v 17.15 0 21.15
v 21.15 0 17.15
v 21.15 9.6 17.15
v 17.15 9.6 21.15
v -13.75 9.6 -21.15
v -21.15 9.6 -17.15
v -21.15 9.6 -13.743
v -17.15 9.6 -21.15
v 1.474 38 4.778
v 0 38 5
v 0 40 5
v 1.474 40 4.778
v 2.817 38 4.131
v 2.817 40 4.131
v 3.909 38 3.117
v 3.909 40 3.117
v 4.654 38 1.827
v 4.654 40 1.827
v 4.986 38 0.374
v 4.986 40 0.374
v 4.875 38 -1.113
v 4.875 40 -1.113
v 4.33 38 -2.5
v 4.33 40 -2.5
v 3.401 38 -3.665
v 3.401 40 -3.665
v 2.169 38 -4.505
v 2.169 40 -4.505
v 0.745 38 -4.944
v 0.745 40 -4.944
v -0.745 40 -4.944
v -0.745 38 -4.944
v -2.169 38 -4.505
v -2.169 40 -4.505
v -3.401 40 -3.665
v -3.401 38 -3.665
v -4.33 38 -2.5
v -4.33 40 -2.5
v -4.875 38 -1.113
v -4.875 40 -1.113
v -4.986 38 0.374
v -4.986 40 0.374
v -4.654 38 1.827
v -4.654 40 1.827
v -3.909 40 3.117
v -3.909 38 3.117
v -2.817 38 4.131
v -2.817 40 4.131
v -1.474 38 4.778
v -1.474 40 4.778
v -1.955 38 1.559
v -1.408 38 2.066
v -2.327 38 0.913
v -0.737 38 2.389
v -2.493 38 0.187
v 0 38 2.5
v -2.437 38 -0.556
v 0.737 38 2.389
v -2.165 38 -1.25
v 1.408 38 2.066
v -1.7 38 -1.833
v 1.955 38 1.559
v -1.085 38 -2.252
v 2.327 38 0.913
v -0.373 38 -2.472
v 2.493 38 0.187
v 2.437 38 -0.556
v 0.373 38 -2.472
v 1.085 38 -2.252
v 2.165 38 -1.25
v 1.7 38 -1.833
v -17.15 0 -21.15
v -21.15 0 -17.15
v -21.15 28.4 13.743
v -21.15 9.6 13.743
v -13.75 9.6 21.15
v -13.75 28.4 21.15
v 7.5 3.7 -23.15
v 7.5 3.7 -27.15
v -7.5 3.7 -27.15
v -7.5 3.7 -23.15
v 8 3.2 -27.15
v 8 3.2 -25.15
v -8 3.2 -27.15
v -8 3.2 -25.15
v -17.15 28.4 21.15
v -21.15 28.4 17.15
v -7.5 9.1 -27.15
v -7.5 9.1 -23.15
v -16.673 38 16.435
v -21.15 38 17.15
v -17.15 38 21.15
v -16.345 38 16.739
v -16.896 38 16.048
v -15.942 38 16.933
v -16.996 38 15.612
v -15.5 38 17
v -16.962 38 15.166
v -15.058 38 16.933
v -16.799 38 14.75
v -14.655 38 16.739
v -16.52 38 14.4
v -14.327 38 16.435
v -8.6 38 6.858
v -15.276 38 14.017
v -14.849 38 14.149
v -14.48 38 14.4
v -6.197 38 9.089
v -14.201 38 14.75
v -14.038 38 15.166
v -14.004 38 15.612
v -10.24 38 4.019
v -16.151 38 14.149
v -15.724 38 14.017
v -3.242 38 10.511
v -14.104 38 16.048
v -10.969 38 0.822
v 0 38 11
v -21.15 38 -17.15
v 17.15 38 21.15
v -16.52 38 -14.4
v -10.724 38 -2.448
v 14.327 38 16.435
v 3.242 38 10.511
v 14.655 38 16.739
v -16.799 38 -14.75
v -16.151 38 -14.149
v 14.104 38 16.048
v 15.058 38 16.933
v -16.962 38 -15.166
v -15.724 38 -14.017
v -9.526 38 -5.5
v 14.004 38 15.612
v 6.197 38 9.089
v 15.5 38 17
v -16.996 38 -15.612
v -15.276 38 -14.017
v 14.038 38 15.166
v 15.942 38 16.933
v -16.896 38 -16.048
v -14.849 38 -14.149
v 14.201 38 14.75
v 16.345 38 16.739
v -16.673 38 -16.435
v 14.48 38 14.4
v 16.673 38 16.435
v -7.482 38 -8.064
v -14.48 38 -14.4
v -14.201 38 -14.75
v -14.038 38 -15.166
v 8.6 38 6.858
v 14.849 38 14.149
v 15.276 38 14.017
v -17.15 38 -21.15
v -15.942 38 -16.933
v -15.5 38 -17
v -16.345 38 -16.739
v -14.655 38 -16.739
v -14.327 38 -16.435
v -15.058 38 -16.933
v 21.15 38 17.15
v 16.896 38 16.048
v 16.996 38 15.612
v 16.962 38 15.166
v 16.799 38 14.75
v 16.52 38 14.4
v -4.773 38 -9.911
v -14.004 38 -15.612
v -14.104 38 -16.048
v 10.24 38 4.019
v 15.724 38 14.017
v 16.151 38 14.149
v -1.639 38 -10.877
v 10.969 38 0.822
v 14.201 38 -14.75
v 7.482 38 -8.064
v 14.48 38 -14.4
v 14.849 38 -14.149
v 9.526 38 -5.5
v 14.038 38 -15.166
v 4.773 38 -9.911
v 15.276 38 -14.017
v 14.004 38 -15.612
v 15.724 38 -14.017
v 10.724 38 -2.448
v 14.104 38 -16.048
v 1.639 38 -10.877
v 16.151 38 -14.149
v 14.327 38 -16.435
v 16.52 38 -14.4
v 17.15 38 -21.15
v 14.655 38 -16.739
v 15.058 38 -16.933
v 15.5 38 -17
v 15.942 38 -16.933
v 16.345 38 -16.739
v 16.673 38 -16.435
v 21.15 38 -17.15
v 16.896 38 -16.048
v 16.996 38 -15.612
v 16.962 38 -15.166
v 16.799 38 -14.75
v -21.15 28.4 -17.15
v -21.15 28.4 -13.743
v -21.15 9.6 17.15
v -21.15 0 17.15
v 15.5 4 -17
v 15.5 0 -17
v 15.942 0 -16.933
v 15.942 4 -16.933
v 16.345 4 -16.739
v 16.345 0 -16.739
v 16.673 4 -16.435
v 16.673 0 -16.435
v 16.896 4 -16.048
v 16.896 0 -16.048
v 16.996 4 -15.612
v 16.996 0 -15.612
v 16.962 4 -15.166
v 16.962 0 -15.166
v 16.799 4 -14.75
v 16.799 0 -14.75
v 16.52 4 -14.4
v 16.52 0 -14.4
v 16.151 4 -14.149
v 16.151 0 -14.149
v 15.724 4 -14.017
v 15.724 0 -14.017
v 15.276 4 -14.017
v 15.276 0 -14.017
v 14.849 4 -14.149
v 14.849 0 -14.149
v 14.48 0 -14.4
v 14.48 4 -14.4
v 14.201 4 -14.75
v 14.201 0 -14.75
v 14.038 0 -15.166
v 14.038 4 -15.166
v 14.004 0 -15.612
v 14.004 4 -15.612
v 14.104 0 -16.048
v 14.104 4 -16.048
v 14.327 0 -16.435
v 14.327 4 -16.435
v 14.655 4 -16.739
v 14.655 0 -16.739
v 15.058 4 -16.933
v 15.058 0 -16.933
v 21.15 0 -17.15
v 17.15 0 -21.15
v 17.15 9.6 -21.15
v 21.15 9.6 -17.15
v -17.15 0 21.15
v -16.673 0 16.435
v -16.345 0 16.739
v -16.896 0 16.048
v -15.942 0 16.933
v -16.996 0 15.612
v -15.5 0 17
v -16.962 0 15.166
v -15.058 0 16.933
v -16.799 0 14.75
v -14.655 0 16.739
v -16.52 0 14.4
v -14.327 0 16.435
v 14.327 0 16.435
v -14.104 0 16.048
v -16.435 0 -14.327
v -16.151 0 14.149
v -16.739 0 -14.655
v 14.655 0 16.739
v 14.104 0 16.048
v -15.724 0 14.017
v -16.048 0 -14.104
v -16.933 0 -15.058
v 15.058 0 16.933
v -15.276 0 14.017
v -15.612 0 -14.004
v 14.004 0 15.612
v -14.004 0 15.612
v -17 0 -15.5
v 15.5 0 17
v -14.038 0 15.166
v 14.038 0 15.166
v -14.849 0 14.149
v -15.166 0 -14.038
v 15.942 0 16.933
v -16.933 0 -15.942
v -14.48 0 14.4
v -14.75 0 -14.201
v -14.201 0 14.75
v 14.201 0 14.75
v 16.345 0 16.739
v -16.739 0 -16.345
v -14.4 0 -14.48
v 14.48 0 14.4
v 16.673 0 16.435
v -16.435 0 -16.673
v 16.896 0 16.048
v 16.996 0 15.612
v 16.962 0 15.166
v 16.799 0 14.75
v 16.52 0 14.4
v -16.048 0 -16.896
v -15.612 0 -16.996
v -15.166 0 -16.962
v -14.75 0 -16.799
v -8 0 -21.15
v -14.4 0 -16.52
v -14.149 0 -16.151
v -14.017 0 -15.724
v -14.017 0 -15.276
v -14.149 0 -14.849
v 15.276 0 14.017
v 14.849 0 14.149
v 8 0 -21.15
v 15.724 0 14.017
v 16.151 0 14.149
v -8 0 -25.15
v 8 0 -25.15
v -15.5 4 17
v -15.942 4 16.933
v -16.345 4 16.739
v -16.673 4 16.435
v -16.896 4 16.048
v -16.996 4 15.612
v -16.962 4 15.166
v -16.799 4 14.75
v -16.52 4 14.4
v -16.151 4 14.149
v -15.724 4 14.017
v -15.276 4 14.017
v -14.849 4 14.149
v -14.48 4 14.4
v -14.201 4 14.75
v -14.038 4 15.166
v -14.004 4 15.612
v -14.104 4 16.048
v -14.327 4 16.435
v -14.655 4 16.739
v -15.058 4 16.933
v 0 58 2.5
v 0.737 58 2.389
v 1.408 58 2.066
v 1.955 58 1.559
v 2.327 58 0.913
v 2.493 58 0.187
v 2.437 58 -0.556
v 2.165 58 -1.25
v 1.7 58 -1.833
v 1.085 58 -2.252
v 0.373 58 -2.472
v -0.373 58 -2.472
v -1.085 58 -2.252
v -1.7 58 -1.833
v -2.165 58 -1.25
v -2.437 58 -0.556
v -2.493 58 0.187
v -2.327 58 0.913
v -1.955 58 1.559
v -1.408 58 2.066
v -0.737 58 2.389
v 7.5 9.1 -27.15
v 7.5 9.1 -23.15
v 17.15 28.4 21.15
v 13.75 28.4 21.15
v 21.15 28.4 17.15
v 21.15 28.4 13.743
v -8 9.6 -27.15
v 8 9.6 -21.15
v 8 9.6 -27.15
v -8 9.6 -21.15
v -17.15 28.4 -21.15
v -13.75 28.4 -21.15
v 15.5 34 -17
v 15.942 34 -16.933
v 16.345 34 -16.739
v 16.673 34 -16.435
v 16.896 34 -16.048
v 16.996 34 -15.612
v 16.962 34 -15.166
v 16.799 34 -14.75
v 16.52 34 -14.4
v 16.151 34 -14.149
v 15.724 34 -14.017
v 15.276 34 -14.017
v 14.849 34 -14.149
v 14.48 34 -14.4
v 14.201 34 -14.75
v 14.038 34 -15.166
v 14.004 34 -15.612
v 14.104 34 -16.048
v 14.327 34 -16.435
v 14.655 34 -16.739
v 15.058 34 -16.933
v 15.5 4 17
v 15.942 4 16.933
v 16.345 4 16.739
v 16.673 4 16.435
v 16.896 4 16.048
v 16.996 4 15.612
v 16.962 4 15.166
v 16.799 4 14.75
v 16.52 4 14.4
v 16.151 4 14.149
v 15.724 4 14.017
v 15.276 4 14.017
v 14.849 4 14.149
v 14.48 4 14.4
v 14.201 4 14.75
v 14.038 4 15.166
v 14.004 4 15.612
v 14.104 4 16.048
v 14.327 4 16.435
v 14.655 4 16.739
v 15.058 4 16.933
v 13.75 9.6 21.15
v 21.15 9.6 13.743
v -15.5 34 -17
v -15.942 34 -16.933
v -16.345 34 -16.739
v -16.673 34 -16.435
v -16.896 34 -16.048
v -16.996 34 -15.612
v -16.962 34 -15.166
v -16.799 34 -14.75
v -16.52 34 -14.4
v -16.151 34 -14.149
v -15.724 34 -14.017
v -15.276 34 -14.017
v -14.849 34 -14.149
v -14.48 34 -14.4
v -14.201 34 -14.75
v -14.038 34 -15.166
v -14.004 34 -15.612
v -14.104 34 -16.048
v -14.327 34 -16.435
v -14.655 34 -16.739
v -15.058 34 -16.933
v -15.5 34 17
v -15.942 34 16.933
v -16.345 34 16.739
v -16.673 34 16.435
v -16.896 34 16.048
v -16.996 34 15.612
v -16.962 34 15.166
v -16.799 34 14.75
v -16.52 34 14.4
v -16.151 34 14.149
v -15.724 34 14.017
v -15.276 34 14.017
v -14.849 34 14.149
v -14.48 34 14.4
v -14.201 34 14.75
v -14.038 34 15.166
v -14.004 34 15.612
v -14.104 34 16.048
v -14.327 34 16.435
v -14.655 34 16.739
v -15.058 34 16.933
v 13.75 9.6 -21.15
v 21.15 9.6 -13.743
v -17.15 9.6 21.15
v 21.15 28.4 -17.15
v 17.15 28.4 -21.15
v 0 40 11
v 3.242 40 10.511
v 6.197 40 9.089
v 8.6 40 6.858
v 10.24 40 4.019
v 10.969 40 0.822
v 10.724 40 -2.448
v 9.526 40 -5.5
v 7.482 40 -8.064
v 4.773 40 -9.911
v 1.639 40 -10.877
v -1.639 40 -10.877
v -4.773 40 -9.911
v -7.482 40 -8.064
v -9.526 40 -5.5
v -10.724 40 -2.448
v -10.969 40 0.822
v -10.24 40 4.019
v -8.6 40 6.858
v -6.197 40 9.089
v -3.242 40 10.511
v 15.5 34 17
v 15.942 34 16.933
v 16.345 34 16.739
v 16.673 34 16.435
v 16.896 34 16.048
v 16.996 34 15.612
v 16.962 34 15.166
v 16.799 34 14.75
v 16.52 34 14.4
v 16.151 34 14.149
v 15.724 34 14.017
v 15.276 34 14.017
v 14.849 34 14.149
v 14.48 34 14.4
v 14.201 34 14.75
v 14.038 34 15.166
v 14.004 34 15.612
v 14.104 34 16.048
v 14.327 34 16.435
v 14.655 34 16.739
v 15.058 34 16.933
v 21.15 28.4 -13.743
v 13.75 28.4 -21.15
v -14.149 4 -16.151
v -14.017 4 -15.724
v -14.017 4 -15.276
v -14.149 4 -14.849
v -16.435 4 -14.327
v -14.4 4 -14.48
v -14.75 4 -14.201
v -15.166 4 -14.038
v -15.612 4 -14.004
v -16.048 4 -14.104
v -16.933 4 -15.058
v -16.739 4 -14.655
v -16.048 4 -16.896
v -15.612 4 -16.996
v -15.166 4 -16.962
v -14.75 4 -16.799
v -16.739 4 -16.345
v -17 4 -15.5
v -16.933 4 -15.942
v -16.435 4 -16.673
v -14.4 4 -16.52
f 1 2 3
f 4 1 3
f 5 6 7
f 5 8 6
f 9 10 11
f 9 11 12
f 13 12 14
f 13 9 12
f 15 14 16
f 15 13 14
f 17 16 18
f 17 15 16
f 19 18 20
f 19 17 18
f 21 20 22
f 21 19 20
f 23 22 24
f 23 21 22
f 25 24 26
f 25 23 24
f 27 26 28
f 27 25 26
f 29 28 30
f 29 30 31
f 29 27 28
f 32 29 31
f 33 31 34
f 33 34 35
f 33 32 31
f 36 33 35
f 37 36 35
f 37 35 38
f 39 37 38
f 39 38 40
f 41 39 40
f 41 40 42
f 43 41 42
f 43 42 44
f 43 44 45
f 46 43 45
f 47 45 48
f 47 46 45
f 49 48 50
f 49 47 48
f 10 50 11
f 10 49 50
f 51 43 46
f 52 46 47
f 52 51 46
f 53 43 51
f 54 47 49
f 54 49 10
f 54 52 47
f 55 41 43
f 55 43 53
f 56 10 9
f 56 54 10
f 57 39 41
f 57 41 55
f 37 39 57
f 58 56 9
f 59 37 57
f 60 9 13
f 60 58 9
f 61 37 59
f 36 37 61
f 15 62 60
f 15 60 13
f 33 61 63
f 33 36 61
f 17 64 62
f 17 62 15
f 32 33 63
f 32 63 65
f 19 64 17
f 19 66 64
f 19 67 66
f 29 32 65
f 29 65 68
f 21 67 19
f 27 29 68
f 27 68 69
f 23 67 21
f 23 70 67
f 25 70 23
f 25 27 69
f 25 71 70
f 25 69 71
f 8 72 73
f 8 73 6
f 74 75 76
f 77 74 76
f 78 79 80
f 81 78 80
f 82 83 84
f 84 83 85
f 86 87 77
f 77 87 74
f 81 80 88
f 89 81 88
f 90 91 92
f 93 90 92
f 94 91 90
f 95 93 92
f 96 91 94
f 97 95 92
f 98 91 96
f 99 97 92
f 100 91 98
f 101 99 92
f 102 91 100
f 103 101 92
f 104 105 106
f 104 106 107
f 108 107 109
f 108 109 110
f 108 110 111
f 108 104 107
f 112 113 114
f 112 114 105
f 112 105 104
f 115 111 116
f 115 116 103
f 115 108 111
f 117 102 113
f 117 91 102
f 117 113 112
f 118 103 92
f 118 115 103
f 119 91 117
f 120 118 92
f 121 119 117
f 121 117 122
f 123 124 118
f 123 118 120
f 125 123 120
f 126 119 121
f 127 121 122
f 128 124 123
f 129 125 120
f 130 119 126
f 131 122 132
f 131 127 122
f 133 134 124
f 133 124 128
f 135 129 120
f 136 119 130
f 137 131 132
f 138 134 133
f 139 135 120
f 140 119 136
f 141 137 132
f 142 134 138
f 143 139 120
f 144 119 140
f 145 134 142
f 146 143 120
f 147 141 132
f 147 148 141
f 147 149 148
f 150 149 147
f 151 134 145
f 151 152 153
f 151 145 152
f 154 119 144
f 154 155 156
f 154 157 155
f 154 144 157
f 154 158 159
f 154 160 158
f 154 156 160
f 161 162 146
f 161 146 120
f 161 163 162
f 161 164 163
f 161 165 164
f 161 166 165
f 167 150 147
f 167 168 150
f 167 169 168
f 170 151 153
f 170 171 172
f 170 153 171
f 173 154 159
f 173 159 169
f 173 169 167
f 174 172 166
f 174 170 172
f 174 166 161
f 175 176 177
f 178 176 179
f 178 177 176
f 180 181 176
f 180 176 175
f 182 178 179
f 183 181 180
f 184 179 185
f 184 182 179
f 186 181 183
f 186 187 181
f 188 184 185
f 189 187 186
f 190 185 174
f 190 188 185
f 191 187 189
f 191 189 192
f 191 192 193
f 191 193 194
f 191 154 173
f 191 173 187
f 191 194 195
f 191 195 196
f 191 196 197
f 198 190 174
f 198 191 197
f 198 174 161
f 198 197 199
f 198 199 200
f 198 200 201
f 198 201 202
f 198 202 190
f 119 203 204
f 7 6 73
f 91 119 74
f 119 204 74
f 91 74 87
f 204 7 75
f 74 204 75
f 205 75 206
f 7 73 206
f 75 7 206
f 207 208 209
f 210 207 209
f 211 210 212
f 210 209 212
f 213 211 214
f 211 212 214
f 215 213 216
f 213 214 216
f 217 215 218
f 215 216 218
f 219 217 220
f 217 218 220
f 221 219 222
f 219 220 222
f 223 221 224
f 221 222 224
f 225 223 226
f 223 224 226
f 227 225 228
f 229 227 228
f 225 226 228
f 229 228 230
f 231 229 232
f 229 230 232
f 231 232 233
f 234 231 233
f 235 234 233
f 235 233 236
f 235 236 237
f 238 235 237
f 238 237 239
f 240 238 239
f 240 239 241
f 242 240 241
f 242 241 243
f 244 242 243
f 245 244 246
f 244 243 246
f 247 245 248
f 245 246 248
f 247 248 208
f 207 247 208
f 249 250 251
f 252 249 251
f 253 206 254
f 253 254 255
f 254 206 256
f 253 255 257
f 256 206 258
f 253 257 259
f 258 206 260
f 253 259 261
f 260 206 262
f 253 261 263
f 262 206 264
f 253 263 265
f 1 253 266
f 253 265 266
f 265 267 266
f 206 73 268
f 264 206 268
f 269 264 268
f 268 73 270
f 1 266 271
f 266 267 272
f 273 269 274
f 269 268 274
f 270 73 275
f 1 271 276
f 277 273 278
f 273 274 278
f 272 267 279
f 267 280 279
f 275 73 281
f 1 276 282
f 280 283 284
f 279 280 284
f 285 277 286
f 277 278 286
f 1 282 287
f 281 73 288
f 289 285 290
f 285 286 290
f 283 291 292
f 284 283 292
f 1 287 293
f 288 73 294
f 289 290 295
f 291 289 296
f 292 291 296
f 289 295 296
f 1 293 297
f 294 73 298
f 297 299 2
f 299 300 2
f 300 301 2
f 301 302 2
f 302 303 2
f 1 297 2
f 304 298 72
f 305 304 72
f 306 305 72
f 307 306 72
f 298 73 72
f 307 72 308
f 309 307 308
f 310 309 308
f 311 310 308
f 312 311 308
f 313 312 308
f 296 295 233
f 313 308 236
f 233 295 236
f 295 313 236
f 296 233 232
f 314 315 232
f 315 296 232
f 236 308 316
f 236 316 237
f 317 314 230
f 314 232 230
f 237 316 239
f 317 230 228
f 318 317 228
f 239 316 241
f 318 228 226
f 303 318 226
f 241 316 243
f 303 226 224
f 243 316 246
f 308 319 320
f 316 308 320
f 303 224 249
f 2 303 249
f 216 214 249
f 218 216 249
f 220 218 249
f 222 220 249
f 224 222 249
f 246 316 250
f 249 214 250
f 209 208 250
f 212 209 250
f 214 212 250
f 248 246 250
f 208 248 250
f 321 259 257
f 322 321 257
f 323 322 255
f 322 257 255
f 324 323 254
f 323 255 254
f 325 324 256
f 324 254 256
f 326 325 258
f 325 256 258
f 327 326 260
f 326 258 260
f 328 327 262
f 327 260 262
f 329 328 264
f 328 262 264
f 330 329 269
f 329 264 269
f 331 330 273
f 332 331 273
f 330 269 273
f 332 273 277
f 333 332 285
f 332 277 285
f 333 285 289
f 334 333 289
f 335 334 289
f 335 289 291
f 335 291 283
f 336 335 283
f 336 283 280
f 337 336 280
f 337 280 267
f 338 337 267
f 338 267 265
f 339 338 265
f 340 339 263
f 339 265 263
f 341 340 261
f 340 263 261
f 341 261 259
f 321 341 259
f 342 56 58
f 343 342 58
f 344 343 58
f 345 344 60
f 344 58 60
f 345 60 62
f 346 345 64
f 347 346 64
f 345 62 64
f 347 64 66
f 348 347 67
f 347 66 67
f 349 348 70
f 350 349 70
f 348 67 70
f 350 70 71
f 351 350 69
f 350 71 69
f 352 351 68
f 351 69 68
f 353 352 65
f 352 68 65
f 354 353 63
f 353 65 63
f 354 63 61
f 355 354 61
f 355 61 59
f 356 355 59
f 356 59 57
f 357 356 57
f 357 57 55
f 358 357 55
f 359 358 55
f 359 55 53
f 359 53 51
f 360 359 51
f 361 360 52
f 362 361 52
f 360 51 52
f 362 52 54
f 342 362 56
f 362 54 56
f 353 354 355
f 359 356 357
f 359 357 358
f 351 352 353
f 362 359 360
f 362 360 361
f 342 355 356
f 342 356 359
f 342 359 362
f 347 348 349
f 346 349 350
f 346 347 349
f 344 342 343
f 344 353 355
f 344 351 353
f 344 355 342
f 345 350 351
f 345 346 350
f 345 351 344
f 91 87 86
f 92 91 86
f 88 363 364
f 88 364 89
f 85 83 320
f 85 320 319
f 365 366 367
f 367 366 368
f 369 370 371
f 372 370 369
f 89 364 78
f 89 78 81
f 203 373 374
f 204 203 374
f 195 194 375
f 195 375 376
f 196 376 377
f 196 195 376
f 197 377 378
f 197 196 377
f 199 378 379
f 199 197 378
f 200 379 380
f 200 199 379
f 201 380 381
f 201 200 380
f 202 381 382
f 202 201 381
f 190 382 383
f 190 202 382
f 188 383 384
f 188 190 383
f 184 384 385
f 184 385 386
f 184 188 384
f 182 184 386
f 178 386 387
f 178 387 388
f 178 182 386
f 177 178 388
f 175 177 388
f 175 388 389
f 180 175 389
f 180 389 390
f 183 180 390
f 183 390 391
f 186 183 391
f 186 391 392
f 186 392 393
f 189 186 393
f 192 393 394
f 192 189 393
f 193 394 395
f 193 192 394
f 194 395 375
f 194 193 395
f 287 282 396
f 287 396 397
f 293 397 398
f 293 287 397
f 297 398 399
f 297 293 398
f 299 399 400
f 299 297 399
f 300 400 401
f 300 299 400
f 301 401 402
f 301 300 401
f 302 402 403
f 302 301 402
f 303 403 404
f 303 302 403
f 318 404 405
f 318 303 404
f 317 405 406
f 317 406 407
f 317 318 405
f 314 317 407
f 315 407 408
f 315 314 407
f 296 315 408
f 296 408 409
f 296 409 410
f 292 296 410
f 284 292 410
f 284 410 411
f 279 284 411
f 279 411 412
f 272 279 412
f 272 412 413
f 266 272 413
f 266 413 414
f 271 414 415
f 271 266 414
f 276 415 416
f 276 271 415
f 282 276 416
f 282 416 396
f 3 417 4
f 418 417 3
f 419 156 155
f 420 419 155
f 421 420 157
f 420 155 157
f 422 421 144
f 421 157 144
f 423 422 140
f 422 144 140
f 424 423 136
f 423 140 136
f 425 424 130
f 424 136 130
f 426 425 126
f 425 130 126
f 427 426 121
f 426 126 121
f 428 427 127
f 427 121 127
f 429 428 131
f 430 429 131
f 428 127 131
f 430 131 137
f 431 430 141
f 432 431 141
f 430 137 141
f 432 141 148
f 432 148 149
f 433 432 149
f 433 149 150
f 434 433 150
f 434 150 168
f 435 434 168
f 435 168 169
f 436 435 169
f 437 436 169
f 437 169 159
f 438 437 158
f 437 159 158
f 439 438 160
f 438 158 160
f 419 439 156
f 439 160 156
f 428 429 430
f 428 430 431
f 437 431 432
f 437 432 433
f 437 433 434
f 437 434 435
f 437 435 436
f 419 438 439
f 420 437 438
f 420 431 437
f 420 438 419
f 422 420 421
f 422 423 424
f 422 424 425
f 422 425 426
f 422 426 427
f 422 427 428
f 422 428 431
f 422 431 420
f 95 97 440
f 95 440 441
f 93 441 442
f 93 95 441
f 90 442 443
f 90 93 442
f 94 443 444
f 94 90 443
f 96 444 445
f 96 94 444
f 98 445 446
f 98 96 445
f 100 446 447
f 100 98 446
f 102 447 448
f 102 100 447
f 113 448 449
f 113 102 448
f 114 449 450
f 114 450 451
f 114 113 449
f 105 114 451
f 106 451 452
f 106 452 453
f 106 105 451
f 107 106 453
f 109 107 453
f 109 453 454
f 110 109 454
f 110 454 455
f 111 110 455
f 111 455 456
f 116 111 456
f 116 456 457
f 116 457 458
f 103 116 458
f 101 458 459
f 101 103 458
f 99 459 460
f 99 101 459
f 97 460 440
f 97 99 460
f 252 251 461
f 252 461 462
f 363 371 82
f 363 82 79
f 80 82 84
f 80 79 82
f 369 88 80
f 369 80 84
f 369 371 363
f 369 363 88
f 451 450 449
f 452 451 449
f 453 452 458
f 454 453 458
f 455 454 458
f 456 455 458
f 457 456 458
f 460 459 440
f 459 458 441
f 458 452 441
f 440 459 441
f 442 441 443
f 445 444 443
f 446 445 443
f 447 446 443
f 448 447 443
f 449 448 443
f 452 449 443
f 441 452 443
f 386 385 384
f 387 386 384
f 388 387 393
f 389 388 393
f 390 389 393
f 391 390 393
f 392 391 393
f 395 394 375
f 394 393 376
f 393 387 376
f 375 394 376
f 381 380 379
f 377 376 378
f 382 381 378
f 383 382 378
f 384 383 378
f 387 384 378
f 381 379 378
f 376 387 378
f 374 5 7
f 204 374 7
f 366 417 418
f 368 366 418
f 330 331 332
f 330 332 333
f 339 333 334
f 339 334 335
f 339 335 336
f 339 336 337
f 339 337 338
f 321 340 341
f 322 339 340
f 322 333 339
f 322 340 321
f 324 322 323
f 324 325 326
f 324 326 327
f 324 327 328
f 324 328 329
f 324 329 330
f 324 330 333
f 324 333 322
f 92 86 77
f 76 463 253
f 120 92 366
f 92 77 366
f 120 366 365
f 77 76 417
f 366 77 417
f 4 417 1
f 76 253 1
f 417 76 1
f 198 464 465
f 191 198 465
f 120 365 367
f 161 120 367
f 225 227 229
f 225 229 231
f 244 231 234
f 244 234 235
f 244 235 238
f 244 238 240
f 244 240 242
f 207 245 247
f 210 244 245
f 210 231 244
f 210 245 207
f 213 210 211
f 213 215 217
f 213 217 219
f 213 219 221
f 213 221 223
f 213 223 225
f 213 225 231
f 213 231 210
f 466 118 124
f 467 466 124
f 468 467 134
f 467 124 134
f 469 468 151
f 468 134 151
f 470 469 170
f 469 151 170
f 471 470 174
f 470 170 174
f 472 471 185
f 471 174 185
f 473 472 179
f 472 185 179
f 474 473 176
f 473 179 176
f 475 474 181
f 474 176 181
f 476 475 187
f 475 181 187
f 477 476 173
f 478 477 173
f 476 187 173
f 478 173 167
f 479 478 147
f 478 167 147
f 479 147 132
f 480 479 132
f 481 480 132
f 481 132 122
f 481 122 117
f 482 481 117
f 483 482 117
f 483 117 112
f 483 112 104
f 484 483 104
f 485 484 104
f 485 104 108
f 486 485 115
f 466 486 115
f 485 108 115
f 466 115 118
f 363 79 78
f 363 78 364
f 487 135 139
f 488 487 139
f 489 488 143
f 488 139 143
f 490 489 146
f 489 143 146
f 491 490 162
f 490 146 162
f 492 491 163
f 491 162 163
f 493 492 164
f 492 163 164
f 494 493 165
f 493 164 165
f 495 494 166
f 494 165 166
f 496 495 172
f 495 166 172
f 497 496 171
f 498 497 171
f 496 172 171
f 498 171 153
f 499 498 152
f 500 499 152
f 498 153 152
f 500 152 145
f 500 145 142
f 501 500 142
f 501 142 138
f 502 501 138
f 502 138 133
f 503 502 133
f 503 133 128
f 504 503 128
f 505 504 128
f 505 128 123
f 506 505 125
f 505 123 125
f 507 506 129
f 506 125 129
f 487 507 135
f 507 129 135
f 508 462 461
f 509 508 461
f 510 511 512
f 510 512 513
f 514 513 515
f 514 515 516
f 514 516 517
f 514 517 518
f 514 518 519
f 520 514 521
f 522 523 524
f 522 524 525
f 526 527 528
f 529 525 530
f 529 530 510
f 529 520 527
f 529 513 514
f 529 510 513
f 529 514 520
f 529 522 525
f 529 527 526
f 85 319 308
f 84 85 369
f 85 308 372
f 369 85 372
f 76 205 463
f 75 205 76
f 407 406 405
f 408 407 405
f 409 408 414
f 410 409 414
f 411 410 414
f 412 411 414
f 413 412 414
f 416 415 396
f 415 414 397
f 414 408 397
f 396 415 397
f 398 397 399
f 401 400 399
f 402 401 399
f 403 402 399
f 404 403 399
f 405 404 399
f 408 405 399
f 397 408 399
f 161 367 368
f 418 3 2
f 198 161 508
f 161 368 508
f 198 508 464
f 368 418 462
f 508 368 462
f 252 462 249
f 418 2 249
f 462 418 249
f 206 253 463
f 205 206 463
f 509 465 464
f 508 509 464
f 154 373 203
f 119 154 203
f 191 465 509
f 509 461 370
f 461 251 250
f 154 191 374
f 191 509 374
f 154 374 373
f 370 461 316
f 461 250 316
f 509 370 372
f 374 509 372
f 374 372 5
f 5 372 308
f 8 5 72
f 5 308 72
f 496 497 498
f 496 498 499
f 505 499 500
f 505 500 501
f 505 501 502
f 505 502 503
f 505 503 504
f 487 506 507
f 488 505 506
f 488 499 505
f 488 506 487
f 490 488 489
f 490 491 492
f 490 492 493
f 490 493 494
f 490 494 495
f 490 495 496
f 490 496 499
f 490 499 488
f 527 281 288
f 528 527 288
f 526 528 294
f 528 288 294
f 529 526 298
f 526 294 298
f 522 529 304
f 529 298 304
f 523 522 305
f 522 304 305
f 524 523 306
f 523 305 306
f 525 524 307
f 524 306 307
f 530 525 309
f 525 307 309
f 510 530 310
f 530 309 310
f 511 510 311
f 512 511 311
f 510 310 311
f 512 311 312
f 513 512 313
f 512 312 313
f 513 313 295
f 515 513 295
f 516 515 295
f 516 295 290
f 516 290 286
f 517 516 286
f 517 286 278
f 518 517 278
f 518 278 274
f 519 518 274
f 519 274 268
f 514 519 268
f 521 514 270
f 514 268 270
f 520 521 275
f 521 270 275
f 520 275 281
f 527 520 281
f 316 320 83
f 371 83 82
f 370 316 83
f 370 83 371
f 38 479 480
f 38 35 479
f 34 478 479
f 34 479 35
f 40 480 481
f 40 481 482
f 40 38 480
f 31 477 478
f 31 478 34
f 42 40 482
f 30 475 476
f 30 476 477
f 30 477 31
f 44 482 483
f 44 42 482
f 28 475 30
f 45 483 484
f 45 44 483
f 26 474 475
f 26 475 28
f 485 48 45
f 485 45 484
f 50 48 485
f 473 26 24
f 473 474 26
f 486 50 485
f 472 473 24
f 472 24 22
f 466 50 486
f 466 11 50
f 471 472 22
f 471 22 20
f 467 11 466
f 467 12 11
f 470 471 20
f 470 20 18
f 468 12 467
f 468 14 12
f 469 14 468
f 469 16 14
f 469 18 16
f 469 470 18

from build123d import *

# Parameters (mm, degrees)
SKETCH1_W               = 42.3
SKETCH1_H               = 42.3
BOSS_EXTRUDE1_DEPTH     = 9.6
CHAMFER1_SIZE           = 4
BOSS_EXTRUDE2_DEPTH     = 18.8
BOSS_EXTRUDE3_DEPTH     = 9.6
SKETCH4_R               = 11
SKETCH4_R_2             = 5
BOSS_EXTRUDE4_DEPTH     = 2
SKETCH5_R               = 2.5
BOSS_EXTRUDE5_DEPTH     = 20
SKETCH8_R               = 1.5
CUT_EXTRUDE1_DEPTH      = 4
MIRROR2_COPY_1_SKETCH_R = 1.5
MIRROR2_COPY_1_DEPTH    = 4
MIRROR3_COPY_1_SKETCH_R = 1.5
MIRROR3_COPY_1_DEPTH    = 4
MIRROR3_COPY_2_SKETCH_R = 1.5
MIRROR3_COPY_2_DEPTH    = 4
MIRROR3_COPY_3_SKETCH_R = 1.5
MIRROR3_COPY_3_DEPTH    = 4
SKETCH9_W               = 16
SKETCH9_H               = 9.6
BOSS_EXTRUDE6_DEPTH     = 4
SKETCH10_W              = 16
SKETCH10_H              = 6.4
BOSS_EXTRUDE7_DEPTH     = 2
SKETCH11_W              = 15
SKETCH11_H              = 5.4
CUT_EXTRUDE2_DEPTH      = 4


with BuildPart() as part:
    # Sketch1 → Boss-Extrude1 (new body)
    with BuildSketch(Plane(origin=(0, 0, 0), x_dir=(1, 0, 0), z_dir=(0, 1, 0))):
        Rectangle(SKETCH1_W, SKETCH1_H)
    extrude(amount=BOSS_EXTRUDE1_DEPTH)

    # Chamfer1
    chamfer1_edges = [part.edges().sort_by_distance(p)[0] for p in [
        (-21.15, 4.8, -21.15),
        (21.15, 4.8, -21.15),
        (21.15, 4.8, 21.15),
        (-21.15, 4.8, 21.15),
    ]]
    chamfer(chamfer1_edges, length=CHAMFER1_SIZE)

    # Sketch2 → Boss-Extrude2 (add)
    with BuildSketch(Plane(origin=(0, 9.6, 0), x_dir=(1, 0, 0), z_dir=(0, 1, 0))):
        Polygon((13.75, -21.15), (21.15, -13.74318557), (21.15, 13.74318557), (13.75, 21.15), (-13.75, 21.15), (-21.15, 13.74318557), (-21.15, -13.74318557), (-13.75, -21.15), align=None)
    extrude(amount=BOSS_EXTRUDE2_DEPTH)

    # Sketch3 → Boss-Extrude3 (add)
    with BuildSketch(Plane(origin=(0, 28.4, 0), x_dir=(1, 0, 0), z_dir=(0, 1, 0))):
        Polygon((17.15, 21.15), (-17.15, 21.15), (-21.15, 17.15), (-21.15, -17.15), (-17.15, -21.15), (17.15, -21.15), (21.15, -17.15), (21.15, 17.15), align=None)
    extrude(amount=BOSS_EXTRUDE3_DEPTH)

    # Sketch4 → Boss-Extrude4 (add)
    with BuildSketch(Plane(origin=(0, 38, 0), x_dir=(1, 0, 0), z_dir=(0, 1, 0))):
        with Locations(Location((0, 0, 0), (0, 0, 270))):
            Circle(SKETCH4_R)
        with Locations(Location((0, 0, 0), (0, 0, 270))):
            Circle(SKETCH4_R_2, mode=Mode.SUBTRACT)
    extrude(amount=BOSS_EXTRUDE4_DEPTH)

    # Sketch5 → Boss-Extrude5 (add)
    with BuildSketch(Plane(origin=(0, 38, 0), x_dir=(1, 0, 0), z_dir=(0, 1, 0))):
        with Locations(Location((0, 0, 0), (0, 0, 270))):
            Circle(SKETCH5_R)
    extrude(amount=BOSS_EXTRUDE5_DEPTH)

    # Sketch8 → Cut-Extrude1 (cut)
    with BuildSketch(Plane(origin=(0, 38, 0), x_dir=(1, 0, 0), z_dir=(0, 1, 0))):
        with Locations(Location((15.5, -15.5, 0), (0, 0, 270))):
            Circle(SKETCH8_R)
    cut_extrude1 = extrude(amount=-CUT_EXTRUDE1_DEPTH, mode=Mode.SUBTRACT)

    # Mirror1: Cut-Extrude1 across plane
    add(cut_extrude1.mirror(Plane.XY), mode=Mode.SUBTRACT)

    # Mirror2: Cut-Extrude1 across plane
    add(cut_extrude1.mirror(Plane(origin=(0, 0, 0), x_dir=(0, 0, 1), z_dir=(1, 0, 0))), mode=Mode.SUBTRACT)

    # Mirror2 copy 1 sketch → Mirror2 copy 1 (cut)
    with BuildSketch(Plane(origin=(0, 38, 0), x_dir=(-1, 0, 0), z_dir=(0, 1, 0))):
        with Locations(Location((15.5, -15.5, 0), (0, 0, 270))):
            Circle(MIRROR2_COPY_1_SKETCH_R)
    extrude(amount=-MIRROR2_COPY_1_DEPTH, mode=Mode.SUBTRACT)

    # Mirror3: Cut-Extrude1 across plane
    add(cut_extrude1.mirror(Plane.ZX.offset(19)), mode=Mode.SUBTRACT)

    # Mirror3 copy 1 sketch → Mirror3 copy 1 (cut)
    with BuildSketch(Plane.XZ):
        with Locations(Location((15.5, -15.5, 0), (0, 0, 270))):
            Circle(MIRROR3_COPY_1_SKETCH_R)
    extrude(amount=-MIRROR3_COPY_1_DEPTH, mode=Mode.SUBTRACT)

    # Mirror3 copy 2 sketch → Mirror3 copy 2 (cut)
    with BuildSketch(Plane(origin=(0, 0, 0), x_dir=(-1, 0, 0), z_dir=(0, -1, 0))):
        with Locations(Location((15.5, -15.5, 0), (0, 0, 270))):
            Circle(MIRROR3_COPY_2_SKETCH_R)
    extrude(amount=-MIRROR3_COPY_2_DEPTH, mode=Mode.SUBTRACT)

    # Mirror3 copy 3 sketch → Mirror3 copy 3 (cut)
    with BuildSketch(Plane(origin=(0, 0, 0), x_dir=(-1, 0, 0), z_dir=(0, -1, 0))):
        with Locations((15.5, 15.5)):
            Circle(MIRROR3_COPY_3_SKETCH_R)
    extrude(amount=-MIRROR3_COPY_3_DEPTH, mode=Mode.SUBTRACT)

    # Sketch9 → Boss-Extrude6 (add)
    with BuildSketch(Plane(origin=(0, 0, -21.15), x_dir=(-1, 0, 0), z_dir=(0, 0, -1))):
        with Locations((0, 4.8)):
            Rectangle(SKETCH9_W, SKETCH9_H)
    extrude(amount=BOSS_EXTRUDE6_DEPTH)

    # Sketch10 → Boss-Extrude7 (add)
    with BuildSketch(Plane(origin=(0, 0, -25.15), x_dir=(-1, 0, 0), z_dir=(0, 0, -1))):
        with Locations((0, 6.4)):
            Rectangle(SKETCH10_W, SKETCH10_H)
    extrude(amount=BOSS_EXTRUDE7_DEPTH)

    # Sketch11 → Cut-Extrude2 (cut)
    with BuildSketch(Plane(origin=(0, 0, -27.15), x_dir=(-1, 0, 0), z_dir=(0, 0, -1))):
        with Locations((0, 6.4)):
            Rectangle(SKETCH11_W, SKETCH11_H)
    extrude(amount=-CUT_EXTRUDE2_DEPTH, mode=Mode.SUBTRACT)


solid = part.part
